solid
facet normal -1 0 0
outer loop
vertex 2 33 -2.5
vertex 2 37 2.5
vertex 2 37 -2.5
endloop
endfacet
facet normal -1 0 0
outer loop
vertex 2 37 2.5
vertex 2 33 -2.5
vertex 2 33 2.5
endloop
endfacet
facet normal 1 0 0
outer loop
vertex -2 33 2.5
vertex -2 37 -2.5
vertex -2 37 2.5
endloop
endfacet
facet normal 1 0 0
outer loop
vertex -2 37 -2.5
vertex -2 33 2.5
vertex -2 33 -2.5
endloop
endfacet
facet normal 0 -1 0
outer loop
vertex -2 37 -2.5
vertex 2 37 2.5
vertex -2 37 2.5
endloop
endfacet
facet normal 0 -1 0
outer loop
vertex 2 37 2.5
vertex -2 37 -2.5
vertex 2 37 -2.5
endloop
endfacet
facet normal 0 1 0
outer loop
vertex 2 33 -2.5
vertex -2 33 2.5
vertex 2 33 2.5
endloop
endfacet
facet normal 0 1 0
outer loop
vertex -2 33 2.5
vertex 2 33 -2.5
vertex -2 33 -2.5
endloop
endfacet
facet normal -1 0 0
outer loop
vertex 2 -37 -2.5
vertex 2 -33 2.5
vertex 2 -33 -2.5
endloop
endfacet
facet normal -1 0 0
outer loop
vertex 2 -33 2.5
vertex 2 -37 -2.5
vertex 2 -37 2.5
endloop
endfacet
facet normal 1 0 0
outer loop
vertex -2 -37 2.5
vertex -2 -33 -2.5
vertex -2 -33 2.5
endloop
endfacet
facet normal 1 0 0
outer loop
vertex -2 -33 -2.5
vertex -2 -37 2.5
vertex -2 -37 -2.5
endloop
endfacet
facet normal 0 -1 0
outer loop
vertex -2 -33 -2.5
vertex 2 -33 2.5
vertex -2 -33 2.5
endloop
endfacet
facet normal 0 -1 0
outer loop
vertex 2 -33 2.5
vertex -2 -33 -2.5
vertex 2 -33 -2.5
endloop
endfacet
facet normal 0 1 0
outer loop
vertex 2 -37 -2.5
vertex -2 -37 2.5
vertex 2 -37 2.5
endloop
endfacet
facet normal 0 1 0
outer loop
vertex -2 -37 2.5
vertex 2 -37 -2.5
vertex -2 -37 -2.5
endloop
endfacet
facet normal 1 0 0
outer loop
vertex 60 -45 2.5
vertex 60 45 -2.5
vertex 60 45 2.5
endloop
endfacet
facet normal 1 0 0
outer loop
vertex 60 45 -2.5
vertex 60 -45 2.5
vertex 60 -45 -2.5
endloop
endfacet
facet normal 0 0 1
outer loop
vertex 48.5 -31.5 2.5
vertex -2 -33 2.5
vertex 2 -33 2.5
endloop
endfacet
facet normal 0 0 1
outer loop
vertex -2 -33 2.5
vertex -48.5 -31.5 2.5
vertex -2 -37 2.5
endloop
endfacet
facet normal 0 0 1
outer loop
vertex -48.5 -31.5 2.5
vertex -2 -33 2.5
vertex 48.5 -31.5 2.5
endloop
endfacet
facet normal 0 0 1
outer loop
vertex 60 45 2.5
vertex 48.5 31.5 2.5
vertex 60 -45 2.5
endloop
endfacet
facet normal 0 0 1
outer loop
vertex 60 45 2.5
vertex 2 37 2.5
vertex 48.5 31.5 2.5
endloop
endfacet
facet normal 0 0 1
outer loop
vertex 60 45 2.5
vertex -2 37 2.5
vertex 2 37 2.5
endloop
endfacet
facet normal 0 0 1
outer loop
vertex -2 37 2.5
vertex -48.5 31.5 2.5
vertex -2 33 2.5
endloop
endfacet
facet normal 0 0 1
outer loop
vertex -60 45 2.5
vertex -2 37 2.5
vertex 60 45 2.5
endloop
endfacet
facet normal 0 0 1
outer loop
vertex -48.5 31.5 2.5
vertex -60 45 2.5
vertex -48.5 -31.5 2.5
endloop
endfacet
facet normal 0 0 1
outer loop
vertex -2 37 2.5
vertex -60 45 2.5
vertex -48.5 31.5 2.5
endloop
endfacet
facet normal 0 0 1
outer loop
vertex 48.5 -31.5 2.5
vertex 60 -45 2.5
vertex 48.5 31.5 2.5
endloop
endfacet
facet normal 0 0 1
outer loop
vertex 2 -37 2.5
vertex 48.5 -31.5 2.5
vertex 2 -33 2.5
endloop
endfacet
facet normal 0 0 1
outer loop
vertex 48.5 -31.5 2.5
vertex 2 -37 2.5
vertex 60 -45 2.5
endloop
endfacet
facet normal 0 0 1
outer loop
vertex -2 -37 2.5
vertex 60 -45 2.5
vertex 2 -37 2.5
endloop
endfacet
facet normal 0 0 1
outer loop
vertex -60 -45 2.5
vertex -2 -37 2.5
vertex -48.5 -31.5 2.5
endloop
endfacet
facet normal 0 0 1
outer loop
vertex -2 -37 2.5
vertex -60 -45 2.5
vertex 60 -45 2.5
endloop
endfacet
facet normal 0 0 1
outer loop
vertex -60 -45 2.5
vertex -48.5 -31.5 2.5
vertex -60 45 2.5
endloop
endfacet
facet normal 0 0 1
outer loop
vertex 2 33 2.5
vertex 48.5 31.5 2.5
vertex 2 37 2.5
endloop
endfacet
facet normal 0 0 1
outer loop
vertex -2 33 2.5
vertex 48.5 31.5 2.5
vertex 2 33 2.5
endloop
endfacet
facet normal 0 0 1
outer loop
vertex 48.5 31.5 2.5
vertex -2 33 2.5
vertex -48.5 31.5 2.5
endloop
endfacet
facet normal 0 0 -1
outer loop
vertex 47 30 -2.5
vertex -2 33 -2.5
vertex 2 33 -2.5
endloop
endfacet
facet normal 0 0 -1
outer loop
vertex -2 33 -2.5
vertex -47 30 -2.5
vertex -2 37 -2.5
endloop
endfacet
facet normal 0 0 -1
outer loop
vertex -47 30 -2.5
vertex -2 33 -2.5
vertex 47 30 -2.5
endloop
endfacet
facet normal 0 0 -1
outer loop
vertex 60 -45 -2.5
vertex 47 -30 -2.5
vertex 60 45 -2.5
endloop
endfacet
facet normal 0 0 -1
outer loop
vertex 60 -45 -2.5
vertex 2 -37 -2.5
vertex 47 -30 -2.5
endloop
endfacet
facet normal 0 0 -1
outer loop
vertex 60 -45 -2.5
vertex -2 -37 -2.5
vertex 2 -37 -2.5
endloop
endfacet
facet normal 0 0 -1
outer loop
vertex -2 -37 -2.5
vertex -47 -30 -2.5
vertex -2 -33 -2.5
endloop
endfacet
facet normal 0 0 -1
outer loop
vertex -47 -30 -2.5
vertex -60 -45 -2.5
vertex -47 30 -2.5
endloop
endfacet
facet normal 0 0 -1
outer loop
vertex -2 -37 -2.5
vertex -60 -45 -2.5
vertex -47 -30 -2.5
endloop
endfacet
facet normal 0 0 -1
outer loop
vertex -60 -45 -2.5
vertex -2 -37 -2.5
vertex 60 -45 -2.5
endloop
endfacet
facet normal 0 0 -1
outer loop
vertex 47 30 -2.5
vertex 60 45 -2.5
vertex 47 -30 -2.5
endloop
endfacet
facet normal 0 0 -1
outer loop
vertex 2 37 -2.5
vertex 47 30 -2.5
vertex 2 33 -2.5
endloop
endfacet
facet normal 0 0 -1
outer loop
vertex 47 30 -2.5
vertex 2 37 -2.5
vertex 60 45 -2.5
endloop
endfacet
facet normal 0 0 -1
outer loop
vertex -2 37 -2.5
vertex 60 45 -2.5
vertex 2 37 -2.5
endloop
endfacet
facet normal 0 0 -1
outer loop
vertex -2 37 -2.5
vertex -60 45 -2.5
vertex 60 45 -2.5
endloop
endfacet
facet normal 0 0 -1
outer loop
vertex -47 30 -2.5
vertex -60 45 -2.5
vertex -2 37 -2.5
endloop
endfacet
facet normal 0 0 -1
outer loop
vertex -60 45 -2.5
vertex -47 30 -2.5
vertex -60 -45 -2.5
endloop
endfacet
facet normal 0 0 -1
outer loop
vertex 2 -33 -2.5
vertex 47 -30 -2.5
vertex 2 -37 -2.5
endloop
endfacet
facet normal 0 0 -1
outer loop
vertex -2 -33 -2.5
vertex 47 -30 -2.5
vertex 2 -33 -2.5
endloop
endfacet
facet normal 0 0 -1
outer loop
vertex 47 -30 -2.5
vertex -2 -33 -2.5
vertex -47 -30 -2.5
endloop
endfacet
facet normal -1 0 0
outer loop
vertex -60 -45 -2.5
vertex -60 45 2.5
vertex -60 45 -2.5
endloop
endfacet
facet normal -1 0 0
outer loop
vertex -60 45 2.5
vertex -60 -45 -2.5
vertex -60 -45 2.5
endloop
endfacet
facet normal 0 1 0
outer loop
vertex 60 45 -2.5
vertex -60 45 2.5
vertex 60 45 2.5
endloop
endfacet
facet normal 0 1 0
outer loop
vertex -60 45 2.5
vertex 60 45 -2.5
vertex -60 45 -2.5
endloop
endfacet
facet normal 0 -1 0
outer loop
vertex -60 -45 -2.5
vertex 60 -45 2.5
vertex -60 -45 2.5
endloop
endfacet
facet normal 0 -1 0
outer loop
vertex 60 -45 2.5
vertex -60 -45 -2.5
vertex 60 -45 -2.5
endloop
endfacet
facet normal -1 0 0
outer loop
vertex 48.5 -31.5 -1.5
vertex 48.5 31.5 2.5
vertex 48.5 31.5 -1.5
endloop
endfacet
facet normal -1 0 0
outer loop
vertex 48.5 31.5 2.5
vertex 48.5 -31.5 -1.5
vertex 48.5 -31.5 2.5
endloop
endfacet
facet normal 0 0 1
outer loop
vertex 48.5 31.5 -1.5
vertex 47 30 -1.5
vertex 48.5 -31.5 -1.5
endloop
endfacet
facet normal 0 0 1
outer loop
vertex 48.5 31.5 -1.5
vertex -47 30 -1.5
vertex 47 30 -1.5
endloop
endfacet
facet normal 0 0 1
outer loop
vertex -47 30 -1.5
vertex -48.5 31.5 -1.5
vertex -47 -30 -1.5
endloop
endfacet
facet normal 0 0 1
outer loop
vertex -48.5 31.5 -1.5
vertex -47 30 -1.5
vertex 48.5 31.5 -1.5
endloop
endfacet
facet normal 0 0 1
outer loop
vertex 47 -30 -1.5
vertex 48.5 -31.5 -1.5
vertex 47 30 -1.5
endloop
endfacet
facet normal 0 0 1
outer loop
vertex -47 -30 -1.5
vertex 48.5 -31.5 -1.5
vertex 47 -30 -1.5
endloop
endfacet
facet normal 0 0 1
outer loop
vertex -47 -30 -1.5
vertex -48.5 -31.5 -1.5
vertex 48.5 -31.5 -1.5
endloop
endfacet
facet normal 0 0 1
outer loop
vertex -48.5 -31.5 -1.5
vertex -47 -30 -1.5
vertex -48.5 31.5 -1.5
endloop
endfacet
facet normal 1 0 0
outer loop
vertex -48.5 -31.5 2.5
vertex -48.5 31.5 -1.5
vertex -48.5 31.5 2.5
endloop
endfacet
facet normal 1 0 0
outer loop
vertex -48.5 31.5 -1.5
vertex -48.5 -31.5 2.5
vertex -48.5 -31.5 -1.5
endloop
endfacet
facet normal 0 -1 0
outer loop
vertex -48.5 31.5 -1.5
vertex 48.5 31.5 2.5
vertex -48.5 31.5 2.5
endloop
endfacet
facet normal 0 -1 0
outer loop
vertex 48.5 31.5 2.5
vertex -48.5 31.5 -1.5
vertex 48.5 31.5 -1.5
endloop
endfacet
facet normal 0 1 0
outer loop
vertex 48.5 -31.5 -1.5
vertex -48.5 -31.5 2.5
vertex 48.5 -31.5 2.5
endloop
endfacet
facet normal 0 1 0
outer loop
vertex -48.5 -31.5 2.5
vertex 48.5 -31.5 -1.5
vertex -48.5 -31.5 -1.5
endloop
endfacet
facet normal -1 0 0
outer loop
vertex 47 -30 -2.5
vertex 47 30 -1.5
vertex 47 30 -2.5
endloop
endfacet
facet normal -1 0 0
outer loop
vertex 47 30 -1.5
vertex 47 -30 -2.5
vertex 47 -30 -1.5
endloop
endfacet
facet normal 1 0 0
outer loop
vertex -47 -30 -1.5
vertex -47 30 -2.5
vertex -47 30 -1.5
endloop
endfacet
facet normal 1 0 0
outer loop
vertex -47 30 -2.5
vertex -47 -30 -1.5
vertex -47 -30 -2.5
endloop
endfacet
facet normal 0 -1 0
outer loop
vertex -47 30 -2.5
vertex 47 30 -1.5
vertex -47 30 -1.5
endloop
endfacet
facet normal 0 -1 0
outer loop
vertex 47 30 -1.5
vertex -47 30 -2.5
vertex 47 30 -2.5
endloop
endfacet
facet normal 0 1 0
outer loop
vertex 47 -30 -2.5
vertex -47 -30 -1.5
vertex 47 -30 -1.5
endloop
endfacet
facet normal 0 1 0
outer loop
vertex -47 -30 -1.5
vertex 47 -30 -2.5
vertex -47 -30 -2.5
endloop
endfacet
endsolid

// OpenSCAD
// Generated by SolidPython 1.1.3 on 2024-01-12 11:08:41


difference() {
	cube(center = true, size = [120, 90, 5]);
	translate(v = [0, 0, 1]) {
		cube(center = true, size = [97, 63, 5]);
	}
	cube(center = true, size = [94, 60, 10]);
	union() {
		union();
		translate(v = [0, 35.0000000000, 0]) {
			cube(center = true, size = [4, 4, 10]);
		}
		translate(v = [0, -35.0000000000, 0]) {
			cube(center = true, size = [4, 4, 10]);
		}
	}
	union() {
		union();
		translate(v = [0, 35.0000000000, 0]) {
			cube(center = true, size = [4, 4, 10]);
		}
		translate(v = [0, -35.0000000000, 0]) {
			cube(center = true, size = [4, 4, 10]);
		}
	}
}
/***********************************************
*********      SolidPython code:      **********
************************************************
 
#! /usr/bin/env python3
import sys
from math import cos, radians, sin, pi, tau
from pathlib import Path

from solid import *
from solid.utils import *

from typing import Set, Sequence, List, Callable, Optional, Union, Iterable, Tuple

import numpy as np

import extrusion_fittings as ef

class mount():
	def __init__(self,board_length = 97,board_width = 63,plate_length = 120,plate_width = 90, mount_thickness = 5,
					fan_gap_length = 94,fan_gap_width = 60):
		self.board_length = board_length
		self.board_width = board_width
		self.plate_length = plate_length
		self.plate_width = plate_width
		self.mount_thickness = mount_thickness
		self.fan_gap_length = fan_gap_length
		self.fan_gap_width = fan_gap_width

	def ziptie_cutouts(self) -> OpenSCADObject:
		zc = cube([4,4,self.mount_thickness*2],center = True)
		cutouts = OpenSCADObject(name="union",params={})
		cutouts += translate([0,(self.plate_width - 20)/2,0])(zc)
		cutouts += translate([0,(self.plate_width - 20)/-2,0])(zc)
		return cutouts

	def plate(self) -> OpenSCADObject:
		p = cube([self.plate_length,self.plate_width,self.mount_thickness],center = True)
		fan_cutout = cube([self.fan_gap_length,self.fan_gap_width,self.mount_thickness*2], center = True)
		cutout = cube([self.board_length,self.board_width,self.mount_thickness],center = True)
		cutout = translate([0,0,1])(cutout)		
		p -= cutout
		p -= fan_cutout
		p -= self.ziptie_cutouts()
		return p

	def bisect_floor(self,input) -> OpenSCADObject:
		size = 300
		floor = translate([0,0,-150])(cube([300,300,300],center = True))
		return input - floor


if __name__ == "__main__":
	out_dir = sys.argv[1] if len(sys.argv) > 1 else Path(__file__).parent

	# e = ef.Fittings(35)
	# a = e.tube()
	m = mount()	
	# a = translate([0,64,-11])(a)
	a = m.plate()
	a -= m.ziptie_cutouts()
	# a = m.bisect_floor(a)

	file_out = scad_render_to_file(a,  out_dir=out_dir, include_orig_code=True)
	print(f"{__file__}: SCAD file written to: \n{file_out}")
 
 
************************************************/
